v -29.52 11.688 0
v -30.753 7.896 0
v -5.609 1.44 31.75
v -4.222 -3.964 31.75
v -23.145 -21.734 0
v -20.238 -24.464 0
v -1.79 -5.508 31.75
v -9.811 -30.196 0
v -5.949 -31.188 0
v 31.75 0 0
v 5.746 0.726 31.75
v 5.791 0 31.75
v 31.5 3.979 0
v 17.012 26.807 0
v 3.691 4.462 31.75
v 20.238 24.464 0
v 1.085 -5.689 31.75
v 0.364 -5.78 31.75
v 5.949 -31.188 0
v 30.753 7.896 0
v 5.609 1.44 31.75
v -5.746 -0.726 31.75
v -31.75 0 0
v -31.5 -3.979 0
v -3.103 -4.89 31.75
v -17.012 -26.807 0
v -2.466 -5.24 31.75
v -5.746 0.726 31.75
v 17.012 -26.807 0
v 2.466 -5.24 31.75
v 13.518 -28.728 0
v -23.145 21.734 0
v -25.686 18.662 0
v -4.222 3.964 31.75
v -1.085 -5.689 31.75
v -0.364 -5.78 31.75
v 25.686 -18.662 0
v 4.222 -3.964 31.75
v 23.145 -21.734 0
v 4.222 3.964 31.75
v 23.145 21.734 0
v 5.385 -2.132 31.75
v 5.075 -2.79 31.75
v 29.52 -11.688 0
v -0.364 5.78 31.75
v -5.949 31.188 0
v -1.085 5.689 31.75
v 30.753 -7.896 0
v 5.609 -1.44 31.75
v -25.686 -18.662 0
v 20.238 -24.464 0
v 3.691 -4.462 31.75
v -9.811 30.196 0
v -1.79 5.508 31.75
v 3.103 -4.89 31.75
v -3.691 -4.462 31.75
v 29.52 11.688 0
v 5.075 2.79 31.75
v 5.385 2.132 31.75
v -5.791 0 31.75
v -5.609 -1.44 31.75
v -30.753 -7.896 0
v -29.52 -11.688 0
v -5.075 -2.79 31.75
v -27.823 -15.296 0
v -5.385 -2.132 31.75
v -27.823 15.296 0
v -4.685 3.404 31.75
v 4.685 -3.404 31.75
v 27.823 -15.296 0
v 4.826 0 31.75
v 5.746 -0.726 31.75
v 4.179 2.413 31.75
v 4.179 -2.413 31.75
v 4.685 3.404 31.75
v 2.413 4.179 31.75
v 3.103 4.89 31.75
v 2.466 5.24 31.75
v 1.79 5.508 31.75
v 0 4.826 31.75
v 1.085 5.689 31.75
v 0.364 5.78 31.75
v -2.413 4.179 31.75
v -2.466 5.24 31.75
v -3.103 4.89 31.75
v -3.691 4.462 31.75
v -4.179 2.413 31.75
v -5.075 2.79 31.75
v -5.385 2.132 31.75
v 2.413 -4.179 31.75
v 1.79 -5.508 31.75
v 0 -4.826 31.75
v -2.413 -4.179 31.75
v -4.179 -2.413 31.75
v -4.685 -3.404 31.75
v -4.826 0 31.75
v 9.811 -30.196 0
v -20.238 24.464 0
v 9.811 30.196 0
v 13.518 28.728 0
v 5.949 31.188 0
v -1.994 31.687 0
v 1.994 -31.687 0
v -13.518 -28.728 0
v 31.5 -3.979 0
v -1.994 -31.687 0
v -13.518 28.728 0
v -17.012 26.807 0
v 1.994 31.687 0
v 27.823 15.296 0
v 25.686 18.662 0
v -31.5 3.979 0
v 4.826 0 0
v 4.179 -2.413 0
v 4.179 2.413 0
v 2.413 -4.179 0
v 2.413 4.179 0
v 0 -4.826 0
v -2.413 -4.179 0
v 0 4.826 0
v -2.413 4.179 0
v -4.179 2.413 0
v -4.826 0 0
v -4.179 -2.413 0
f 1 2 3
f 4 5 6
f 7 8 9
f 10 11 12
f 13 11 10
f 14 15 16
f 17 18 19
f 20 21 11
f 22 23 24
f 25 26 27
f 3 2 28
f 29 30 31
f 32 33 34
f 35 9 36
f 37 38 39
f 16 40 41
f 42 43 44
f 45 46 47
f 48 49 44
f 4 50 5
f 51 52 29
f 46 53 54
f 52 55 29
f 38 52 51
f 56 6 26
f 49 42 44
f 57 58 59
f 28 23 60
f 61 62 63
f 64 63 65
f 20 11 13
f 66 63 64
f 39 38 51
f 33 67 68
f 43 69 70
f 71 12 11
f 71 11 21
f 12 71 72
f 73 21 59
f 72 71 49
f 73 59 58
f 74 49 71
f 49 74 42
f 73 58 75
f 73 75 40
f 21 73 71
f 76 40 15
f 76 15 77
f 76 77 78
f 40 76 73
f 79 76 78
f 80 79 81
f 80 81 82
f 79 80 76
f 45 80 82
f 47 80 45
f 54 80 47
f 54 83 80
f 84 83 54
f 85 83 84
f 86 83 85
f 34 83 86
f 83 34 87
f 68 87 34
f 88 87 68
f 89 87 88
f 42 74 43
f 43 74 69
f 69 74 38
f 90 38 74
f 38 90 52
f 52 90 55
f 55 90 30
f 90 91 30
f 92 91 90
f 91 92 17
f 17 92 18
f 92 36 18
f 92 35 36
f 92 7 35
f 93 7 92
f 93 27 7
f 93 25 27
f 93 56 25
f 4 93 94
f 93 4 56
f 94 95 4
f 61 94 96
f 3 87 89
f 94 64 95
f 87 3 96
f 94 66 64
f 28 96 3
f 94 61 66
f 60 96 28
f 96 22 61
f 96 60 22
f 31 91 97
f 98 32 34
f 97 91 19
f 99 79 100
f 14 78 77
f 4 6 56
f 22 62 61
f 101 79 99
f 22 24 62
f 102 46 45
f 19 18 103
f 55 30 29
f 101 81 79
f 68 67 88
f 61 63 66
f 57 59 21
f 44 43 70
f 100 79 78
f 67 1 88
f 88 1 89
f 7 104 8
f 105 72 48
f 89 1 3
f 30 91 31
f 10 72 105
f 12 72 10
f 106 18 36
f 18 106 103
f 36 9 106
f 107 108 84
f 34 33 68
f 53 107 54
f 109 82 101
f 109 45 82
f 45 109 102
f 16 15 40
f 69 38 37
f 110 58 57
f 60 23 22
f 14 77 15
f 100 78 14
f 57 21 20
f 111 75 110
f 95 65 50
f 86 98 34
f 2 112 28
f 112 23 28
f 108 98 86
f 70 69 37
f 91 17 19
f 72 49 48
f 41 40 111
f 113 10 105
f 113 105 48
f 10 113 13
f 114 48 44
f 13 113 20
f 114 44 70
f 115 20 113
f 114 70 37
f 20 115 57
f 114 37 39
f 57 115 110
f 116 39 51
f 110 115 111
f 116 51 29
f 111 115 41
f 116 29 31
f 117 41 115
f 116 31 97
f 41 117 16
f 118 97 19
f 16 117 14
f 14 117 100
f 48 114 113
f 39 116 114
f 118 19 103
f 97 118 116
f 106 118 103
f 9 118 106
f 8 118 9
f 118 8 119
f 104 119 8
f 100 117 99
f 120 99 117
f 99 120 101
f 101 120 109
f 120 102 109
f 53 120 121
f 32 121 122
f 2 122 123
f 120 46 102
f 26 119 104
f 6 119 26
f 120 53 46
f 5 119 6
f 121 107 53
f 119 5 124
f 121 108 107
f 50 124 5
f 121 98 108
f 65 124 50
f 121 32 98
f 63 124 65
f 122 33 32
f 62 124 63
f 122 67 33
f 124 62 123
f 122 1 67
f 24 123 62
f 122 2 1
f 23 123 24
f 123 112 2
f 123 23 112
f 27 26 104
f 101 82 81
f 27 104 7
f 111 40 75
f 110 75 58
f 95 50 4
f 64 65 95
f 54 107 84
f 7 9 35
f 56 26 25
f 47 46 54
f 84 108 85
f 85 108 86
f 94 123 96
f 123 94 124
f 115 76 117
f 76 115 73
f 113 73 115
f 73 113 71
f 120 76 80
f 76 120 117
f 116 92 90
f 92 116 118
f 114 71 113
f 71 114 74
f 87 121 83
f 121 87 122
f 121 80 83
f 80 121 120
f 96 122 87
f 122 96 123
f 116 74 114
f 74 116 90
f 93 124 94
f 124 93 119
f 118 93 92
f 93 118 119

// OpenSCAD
use <../../Vitamins/Pipe.scad>;

module PipeCone(nutHeight=0.26, nutDiameter=0.6, boltDiameter=0.38, major=2.5, id=0.32) {
  difference() {

    // Body
    cylinder(r1=major/2, r2=boltDiameter*.6, h=(major/2), $fn=50);

    // Nut
    translate([0,0,(major/2) - nutHeight])
    *cylinder(r=nutDiameter/2, h=nutHeight+0.1, $fn=6);

    // Bolt
    translate([0,0,-0.1])
    cylinder(r=boltDiameter/2, h=major, $fn=12);
  }
}

scale([25.4, 25.4, 25.4])
PipeCone();
